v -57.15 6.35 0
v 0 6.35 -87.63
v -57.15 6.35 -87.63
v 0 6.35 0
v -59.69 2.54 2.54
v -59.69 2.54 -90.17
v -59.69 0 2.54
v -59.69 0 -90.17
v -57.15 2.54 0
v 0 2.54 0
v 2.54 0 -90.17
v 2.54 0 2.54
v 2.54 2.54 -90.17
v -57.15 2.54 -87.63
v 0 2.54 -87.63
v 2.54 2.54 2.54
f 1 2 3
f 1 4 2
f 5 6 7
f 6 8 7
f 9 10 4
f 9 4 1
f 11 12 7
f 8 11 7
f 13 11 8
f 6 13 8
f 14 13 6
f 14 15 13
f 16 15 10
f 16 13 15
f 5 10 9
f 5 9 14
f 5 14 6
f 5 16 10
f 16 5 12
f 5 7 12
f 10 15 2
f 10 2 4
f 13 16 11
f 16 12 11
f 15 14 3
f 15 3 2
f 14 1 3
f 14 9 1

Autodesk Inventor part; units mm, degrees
ref_plane "YZ Plane" through (0, 0, 0) normal (1, 0, 0) x (0, 1, 0)
ref_plane "XZ Plane" through (0, 0, 0) normal (0, 1, 0) x (-1, 0, 0)
ref_plane "XY Plane" through (0, 0, 0) normal (0, 0, 1) x (1, 0, 0)
sketch "Sketch1" plane through (0, 0, 0) normal (0, 1, 0) x (-1, 0, 0)
  line L0 (0, 0) -> (57.15, 0)
  line L1 (57.15, 0) -> (57.15, -87.63)
  line L2 (57.15, -87.63) -> (0, -87.63)
  line L3 (0, -87.63) -> (0, 0)
  line L4 (59.69, -90.17) -> (59.69, 2.54)
  line L5 (59.69, 2.54) -> (-2.54, 2.54)
  line L6 (-2.54, 2.54) -> (-2.54, -90.17)
  line L7 (-2.54, -90.17) -> (59.69, -90.17)
  dimension "d0" = 57.15
  dimension "d1" = 87.63
  dimension "d2" = 2.54
extrude "Extrusion1" add sketch "Sketch1" along normal blind 6.35 contours L0 L1 L2 L3
extrude "Extrusion2" add sketch "Sketch1" along normal blind 2.54
properties part number "LCD"
